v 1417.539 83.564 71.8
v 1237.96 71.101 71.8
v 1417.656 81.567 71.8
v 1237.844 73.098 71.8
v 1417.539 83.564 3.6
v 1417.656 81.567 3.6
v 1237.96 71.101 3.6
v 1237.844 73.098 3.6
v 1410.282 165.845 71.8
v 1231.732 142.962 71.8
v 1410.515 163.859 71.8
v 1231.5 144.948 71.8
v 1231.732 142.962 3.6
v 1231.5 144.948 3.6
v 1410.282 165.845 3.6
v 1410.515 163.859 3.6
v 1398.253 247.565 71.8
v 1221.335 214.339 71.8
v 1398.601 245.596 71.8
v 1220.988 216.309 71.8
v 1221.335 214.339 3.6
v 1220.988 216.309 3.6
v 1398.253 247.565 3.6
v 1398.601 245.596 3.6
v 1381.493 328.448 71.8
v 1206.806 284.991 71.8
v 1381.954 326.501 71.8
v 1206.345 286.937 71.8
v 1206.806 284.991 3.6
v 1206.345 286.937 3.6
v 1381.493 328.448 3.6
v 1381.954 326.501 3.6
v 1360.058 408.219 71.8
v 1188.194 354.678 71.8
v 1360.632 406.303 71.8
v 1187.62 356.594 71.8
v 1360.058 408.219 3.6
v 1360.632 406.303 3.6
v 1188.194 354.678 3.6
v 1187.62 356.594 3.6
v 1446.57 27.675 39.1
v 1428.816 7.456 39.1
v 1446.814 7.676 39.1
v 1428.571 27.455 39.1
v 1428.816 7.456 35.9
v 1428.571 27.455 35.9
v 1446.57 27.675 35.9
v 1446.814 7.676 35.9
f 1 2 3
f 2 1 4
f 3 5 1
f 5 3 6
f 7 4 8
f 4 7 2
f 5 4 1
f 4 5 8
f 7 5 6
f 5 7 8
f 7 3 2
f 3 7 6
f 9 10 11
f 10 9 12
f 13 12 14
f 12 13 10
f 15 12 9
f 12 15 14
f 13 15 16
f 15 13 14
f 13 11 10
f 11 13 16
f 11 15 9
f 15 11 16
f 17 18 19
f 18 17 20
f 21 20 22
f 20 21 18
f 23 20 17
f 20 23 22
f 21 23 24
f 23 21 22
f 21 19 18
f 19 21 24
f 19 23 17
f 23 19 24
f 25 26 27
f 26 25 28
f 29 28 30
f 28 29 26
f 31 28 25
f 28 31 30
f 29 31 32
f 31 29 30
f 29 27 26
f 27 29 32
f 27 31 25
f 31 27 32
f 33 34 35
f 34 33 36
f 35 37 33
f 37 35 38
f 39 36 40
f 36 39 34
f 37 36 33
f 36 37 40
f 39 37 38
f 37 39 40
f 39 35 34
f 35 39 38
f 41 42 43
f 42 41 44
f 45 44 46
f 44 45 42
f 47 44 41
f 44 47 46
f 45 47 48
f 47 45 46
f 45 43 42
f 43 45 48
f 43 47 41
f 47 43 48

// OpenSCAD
/*
 Universal Plenum Diffuser Sector — CONCEPT PROTOTYPE
 Units: mm. Validate material, snap fatigue, airflow, flame, UV and structural
 performance before use. Designed for 3D-printable fit checking, not production.
*/
$fn = 72;

// ---------- USER PARAMETERS ----------
outer_radius       = 1450; // cassette outer radius for 2.9 m nominal OD
inner_radius       = 1180; // plenum inner radius
sector_angle       = 20;   // degrees; 18 sectors make full annulus
plenum_height      = 75;   // requested 3 inch nominal chamber
wall               = 3.2;
base_thickness     = 3.6;
slot_height        = 10;   // equivalent perimeter diffuser opening
slot_pitch         = 35;   // downward-inward discharge angle
vane_count         = 5;
vane_thickness     = 2.0;
tab_width          = 20;
tab_length         = 18;
tab_thickness      = 3.2;
clearance          = 0.35;
show_cutaway       = false;

function pt(r,a,z=0) = [r*cos(a), r*sin(a), z];

module annular_sector(ro, ri, a, h) {
  // Disk-sector subtraction creates robust printable annulus wedge.
  intersection() {
    difference() {
      cylinder(r=ro, h=h);
      cylinder(r=ri, h=h+0.2);
    }
    linear_extrude(height=h+0.2)
      polygon(points=[[0,0], pt(ro+10,0), pt(ro+10,a), pt(ri-10,a), pt(ri-10,0)]);
  }
}

module radial_vane(angle_deg) {
  // Guide vane directs flow from plenum toward the outer diffuser lip.
  rotate([0,0,angle_deg])
  translate([inner_radius + 60, -vane_thickness/2, base_thickness])
    cube([outer_radius-inner_radius-90, vane_thickness, plenum_height-base_thickness-wall]);
}

module male_tab(angle_deg) {
  rotate([0,0,angle_deg])
  translate([outer_radius-wall-tab_length, -tab_width/2, plenum_height/2-tab_thickness/2])
    cube([tab_length, tab_width, tab_thickness]);
}

module female_slot(angle_deg) {
  rotate([0,0,angle_deg])
  translate([outer_radius-wall-tab_length-clearance, -(tab_width+2*clearance)/2, plenum_height/2-(tab_thickness+2*clearance)/2])
    cube([tab_length+wall+clearance, tab_width+2*clearance, tab_thickness+2*clearance]);
}

module diffuser_nozzle() {
  // Outer lip. A rotated rectangular void forms a nominal 10 mm outlet slot.
  // Final nozzle profile requires CFD and smoke/velocity testing.
  difference() {
    annular_sector(outer_radius, outer_radius-wall-14, sector_angle, plenum_height);
    rotate([0,slot_pitch,0])
      translate([outer_radius-wall-24, -20, plenum_height-slot_height/2])
        cube([55, 50, slot_height], center=false);
  }
}

module sector_body() {
  difference() {
    union() {
      // Base and inner/outer walls.
      annular_sector(outer_radius, inner_radius, sector_angle, base_thickness);
      annular_sector(inner_radius+wall, inner_radius, sector_angle, plenum_height);
      diffuser_nozzle();
      // Bearing ribs / guide vanes.
      for (i=[1:vane_count]) radial_vane(i*sector_angle/(vane_count+1));
      male_tab(0.7);
    }
    // Cap mating face is left open to attach a removable upper skin.
    female_slot(sector_angle-0.7);
    if (show_cutaway)
      rotate([0,0,sector_angle/2]) translate([0,-500,-1]) cube([outer_radius,1000,plenum_height+2]);
  }
}

// Optional removable upper skin; print separately if needed.
module upper_skin() {
  difference() {
    annular_sector(outer_radius, inner_radius, sector_angle, wall);
    for (i=[1:vane_count]) radial_vane(i*sector_angle/(vane_count+1));
  }
}

sector_body();
// translate([0,0,plenum_height+8]) upper_skin();

// Print notes:
// - Orient base on print bed; supports may be required beneath diffuser overhang.
// - Use UV-stable, temperature-appropriate material for prototypes.
// - Add drain/cleanout and production fasteners after validation.
